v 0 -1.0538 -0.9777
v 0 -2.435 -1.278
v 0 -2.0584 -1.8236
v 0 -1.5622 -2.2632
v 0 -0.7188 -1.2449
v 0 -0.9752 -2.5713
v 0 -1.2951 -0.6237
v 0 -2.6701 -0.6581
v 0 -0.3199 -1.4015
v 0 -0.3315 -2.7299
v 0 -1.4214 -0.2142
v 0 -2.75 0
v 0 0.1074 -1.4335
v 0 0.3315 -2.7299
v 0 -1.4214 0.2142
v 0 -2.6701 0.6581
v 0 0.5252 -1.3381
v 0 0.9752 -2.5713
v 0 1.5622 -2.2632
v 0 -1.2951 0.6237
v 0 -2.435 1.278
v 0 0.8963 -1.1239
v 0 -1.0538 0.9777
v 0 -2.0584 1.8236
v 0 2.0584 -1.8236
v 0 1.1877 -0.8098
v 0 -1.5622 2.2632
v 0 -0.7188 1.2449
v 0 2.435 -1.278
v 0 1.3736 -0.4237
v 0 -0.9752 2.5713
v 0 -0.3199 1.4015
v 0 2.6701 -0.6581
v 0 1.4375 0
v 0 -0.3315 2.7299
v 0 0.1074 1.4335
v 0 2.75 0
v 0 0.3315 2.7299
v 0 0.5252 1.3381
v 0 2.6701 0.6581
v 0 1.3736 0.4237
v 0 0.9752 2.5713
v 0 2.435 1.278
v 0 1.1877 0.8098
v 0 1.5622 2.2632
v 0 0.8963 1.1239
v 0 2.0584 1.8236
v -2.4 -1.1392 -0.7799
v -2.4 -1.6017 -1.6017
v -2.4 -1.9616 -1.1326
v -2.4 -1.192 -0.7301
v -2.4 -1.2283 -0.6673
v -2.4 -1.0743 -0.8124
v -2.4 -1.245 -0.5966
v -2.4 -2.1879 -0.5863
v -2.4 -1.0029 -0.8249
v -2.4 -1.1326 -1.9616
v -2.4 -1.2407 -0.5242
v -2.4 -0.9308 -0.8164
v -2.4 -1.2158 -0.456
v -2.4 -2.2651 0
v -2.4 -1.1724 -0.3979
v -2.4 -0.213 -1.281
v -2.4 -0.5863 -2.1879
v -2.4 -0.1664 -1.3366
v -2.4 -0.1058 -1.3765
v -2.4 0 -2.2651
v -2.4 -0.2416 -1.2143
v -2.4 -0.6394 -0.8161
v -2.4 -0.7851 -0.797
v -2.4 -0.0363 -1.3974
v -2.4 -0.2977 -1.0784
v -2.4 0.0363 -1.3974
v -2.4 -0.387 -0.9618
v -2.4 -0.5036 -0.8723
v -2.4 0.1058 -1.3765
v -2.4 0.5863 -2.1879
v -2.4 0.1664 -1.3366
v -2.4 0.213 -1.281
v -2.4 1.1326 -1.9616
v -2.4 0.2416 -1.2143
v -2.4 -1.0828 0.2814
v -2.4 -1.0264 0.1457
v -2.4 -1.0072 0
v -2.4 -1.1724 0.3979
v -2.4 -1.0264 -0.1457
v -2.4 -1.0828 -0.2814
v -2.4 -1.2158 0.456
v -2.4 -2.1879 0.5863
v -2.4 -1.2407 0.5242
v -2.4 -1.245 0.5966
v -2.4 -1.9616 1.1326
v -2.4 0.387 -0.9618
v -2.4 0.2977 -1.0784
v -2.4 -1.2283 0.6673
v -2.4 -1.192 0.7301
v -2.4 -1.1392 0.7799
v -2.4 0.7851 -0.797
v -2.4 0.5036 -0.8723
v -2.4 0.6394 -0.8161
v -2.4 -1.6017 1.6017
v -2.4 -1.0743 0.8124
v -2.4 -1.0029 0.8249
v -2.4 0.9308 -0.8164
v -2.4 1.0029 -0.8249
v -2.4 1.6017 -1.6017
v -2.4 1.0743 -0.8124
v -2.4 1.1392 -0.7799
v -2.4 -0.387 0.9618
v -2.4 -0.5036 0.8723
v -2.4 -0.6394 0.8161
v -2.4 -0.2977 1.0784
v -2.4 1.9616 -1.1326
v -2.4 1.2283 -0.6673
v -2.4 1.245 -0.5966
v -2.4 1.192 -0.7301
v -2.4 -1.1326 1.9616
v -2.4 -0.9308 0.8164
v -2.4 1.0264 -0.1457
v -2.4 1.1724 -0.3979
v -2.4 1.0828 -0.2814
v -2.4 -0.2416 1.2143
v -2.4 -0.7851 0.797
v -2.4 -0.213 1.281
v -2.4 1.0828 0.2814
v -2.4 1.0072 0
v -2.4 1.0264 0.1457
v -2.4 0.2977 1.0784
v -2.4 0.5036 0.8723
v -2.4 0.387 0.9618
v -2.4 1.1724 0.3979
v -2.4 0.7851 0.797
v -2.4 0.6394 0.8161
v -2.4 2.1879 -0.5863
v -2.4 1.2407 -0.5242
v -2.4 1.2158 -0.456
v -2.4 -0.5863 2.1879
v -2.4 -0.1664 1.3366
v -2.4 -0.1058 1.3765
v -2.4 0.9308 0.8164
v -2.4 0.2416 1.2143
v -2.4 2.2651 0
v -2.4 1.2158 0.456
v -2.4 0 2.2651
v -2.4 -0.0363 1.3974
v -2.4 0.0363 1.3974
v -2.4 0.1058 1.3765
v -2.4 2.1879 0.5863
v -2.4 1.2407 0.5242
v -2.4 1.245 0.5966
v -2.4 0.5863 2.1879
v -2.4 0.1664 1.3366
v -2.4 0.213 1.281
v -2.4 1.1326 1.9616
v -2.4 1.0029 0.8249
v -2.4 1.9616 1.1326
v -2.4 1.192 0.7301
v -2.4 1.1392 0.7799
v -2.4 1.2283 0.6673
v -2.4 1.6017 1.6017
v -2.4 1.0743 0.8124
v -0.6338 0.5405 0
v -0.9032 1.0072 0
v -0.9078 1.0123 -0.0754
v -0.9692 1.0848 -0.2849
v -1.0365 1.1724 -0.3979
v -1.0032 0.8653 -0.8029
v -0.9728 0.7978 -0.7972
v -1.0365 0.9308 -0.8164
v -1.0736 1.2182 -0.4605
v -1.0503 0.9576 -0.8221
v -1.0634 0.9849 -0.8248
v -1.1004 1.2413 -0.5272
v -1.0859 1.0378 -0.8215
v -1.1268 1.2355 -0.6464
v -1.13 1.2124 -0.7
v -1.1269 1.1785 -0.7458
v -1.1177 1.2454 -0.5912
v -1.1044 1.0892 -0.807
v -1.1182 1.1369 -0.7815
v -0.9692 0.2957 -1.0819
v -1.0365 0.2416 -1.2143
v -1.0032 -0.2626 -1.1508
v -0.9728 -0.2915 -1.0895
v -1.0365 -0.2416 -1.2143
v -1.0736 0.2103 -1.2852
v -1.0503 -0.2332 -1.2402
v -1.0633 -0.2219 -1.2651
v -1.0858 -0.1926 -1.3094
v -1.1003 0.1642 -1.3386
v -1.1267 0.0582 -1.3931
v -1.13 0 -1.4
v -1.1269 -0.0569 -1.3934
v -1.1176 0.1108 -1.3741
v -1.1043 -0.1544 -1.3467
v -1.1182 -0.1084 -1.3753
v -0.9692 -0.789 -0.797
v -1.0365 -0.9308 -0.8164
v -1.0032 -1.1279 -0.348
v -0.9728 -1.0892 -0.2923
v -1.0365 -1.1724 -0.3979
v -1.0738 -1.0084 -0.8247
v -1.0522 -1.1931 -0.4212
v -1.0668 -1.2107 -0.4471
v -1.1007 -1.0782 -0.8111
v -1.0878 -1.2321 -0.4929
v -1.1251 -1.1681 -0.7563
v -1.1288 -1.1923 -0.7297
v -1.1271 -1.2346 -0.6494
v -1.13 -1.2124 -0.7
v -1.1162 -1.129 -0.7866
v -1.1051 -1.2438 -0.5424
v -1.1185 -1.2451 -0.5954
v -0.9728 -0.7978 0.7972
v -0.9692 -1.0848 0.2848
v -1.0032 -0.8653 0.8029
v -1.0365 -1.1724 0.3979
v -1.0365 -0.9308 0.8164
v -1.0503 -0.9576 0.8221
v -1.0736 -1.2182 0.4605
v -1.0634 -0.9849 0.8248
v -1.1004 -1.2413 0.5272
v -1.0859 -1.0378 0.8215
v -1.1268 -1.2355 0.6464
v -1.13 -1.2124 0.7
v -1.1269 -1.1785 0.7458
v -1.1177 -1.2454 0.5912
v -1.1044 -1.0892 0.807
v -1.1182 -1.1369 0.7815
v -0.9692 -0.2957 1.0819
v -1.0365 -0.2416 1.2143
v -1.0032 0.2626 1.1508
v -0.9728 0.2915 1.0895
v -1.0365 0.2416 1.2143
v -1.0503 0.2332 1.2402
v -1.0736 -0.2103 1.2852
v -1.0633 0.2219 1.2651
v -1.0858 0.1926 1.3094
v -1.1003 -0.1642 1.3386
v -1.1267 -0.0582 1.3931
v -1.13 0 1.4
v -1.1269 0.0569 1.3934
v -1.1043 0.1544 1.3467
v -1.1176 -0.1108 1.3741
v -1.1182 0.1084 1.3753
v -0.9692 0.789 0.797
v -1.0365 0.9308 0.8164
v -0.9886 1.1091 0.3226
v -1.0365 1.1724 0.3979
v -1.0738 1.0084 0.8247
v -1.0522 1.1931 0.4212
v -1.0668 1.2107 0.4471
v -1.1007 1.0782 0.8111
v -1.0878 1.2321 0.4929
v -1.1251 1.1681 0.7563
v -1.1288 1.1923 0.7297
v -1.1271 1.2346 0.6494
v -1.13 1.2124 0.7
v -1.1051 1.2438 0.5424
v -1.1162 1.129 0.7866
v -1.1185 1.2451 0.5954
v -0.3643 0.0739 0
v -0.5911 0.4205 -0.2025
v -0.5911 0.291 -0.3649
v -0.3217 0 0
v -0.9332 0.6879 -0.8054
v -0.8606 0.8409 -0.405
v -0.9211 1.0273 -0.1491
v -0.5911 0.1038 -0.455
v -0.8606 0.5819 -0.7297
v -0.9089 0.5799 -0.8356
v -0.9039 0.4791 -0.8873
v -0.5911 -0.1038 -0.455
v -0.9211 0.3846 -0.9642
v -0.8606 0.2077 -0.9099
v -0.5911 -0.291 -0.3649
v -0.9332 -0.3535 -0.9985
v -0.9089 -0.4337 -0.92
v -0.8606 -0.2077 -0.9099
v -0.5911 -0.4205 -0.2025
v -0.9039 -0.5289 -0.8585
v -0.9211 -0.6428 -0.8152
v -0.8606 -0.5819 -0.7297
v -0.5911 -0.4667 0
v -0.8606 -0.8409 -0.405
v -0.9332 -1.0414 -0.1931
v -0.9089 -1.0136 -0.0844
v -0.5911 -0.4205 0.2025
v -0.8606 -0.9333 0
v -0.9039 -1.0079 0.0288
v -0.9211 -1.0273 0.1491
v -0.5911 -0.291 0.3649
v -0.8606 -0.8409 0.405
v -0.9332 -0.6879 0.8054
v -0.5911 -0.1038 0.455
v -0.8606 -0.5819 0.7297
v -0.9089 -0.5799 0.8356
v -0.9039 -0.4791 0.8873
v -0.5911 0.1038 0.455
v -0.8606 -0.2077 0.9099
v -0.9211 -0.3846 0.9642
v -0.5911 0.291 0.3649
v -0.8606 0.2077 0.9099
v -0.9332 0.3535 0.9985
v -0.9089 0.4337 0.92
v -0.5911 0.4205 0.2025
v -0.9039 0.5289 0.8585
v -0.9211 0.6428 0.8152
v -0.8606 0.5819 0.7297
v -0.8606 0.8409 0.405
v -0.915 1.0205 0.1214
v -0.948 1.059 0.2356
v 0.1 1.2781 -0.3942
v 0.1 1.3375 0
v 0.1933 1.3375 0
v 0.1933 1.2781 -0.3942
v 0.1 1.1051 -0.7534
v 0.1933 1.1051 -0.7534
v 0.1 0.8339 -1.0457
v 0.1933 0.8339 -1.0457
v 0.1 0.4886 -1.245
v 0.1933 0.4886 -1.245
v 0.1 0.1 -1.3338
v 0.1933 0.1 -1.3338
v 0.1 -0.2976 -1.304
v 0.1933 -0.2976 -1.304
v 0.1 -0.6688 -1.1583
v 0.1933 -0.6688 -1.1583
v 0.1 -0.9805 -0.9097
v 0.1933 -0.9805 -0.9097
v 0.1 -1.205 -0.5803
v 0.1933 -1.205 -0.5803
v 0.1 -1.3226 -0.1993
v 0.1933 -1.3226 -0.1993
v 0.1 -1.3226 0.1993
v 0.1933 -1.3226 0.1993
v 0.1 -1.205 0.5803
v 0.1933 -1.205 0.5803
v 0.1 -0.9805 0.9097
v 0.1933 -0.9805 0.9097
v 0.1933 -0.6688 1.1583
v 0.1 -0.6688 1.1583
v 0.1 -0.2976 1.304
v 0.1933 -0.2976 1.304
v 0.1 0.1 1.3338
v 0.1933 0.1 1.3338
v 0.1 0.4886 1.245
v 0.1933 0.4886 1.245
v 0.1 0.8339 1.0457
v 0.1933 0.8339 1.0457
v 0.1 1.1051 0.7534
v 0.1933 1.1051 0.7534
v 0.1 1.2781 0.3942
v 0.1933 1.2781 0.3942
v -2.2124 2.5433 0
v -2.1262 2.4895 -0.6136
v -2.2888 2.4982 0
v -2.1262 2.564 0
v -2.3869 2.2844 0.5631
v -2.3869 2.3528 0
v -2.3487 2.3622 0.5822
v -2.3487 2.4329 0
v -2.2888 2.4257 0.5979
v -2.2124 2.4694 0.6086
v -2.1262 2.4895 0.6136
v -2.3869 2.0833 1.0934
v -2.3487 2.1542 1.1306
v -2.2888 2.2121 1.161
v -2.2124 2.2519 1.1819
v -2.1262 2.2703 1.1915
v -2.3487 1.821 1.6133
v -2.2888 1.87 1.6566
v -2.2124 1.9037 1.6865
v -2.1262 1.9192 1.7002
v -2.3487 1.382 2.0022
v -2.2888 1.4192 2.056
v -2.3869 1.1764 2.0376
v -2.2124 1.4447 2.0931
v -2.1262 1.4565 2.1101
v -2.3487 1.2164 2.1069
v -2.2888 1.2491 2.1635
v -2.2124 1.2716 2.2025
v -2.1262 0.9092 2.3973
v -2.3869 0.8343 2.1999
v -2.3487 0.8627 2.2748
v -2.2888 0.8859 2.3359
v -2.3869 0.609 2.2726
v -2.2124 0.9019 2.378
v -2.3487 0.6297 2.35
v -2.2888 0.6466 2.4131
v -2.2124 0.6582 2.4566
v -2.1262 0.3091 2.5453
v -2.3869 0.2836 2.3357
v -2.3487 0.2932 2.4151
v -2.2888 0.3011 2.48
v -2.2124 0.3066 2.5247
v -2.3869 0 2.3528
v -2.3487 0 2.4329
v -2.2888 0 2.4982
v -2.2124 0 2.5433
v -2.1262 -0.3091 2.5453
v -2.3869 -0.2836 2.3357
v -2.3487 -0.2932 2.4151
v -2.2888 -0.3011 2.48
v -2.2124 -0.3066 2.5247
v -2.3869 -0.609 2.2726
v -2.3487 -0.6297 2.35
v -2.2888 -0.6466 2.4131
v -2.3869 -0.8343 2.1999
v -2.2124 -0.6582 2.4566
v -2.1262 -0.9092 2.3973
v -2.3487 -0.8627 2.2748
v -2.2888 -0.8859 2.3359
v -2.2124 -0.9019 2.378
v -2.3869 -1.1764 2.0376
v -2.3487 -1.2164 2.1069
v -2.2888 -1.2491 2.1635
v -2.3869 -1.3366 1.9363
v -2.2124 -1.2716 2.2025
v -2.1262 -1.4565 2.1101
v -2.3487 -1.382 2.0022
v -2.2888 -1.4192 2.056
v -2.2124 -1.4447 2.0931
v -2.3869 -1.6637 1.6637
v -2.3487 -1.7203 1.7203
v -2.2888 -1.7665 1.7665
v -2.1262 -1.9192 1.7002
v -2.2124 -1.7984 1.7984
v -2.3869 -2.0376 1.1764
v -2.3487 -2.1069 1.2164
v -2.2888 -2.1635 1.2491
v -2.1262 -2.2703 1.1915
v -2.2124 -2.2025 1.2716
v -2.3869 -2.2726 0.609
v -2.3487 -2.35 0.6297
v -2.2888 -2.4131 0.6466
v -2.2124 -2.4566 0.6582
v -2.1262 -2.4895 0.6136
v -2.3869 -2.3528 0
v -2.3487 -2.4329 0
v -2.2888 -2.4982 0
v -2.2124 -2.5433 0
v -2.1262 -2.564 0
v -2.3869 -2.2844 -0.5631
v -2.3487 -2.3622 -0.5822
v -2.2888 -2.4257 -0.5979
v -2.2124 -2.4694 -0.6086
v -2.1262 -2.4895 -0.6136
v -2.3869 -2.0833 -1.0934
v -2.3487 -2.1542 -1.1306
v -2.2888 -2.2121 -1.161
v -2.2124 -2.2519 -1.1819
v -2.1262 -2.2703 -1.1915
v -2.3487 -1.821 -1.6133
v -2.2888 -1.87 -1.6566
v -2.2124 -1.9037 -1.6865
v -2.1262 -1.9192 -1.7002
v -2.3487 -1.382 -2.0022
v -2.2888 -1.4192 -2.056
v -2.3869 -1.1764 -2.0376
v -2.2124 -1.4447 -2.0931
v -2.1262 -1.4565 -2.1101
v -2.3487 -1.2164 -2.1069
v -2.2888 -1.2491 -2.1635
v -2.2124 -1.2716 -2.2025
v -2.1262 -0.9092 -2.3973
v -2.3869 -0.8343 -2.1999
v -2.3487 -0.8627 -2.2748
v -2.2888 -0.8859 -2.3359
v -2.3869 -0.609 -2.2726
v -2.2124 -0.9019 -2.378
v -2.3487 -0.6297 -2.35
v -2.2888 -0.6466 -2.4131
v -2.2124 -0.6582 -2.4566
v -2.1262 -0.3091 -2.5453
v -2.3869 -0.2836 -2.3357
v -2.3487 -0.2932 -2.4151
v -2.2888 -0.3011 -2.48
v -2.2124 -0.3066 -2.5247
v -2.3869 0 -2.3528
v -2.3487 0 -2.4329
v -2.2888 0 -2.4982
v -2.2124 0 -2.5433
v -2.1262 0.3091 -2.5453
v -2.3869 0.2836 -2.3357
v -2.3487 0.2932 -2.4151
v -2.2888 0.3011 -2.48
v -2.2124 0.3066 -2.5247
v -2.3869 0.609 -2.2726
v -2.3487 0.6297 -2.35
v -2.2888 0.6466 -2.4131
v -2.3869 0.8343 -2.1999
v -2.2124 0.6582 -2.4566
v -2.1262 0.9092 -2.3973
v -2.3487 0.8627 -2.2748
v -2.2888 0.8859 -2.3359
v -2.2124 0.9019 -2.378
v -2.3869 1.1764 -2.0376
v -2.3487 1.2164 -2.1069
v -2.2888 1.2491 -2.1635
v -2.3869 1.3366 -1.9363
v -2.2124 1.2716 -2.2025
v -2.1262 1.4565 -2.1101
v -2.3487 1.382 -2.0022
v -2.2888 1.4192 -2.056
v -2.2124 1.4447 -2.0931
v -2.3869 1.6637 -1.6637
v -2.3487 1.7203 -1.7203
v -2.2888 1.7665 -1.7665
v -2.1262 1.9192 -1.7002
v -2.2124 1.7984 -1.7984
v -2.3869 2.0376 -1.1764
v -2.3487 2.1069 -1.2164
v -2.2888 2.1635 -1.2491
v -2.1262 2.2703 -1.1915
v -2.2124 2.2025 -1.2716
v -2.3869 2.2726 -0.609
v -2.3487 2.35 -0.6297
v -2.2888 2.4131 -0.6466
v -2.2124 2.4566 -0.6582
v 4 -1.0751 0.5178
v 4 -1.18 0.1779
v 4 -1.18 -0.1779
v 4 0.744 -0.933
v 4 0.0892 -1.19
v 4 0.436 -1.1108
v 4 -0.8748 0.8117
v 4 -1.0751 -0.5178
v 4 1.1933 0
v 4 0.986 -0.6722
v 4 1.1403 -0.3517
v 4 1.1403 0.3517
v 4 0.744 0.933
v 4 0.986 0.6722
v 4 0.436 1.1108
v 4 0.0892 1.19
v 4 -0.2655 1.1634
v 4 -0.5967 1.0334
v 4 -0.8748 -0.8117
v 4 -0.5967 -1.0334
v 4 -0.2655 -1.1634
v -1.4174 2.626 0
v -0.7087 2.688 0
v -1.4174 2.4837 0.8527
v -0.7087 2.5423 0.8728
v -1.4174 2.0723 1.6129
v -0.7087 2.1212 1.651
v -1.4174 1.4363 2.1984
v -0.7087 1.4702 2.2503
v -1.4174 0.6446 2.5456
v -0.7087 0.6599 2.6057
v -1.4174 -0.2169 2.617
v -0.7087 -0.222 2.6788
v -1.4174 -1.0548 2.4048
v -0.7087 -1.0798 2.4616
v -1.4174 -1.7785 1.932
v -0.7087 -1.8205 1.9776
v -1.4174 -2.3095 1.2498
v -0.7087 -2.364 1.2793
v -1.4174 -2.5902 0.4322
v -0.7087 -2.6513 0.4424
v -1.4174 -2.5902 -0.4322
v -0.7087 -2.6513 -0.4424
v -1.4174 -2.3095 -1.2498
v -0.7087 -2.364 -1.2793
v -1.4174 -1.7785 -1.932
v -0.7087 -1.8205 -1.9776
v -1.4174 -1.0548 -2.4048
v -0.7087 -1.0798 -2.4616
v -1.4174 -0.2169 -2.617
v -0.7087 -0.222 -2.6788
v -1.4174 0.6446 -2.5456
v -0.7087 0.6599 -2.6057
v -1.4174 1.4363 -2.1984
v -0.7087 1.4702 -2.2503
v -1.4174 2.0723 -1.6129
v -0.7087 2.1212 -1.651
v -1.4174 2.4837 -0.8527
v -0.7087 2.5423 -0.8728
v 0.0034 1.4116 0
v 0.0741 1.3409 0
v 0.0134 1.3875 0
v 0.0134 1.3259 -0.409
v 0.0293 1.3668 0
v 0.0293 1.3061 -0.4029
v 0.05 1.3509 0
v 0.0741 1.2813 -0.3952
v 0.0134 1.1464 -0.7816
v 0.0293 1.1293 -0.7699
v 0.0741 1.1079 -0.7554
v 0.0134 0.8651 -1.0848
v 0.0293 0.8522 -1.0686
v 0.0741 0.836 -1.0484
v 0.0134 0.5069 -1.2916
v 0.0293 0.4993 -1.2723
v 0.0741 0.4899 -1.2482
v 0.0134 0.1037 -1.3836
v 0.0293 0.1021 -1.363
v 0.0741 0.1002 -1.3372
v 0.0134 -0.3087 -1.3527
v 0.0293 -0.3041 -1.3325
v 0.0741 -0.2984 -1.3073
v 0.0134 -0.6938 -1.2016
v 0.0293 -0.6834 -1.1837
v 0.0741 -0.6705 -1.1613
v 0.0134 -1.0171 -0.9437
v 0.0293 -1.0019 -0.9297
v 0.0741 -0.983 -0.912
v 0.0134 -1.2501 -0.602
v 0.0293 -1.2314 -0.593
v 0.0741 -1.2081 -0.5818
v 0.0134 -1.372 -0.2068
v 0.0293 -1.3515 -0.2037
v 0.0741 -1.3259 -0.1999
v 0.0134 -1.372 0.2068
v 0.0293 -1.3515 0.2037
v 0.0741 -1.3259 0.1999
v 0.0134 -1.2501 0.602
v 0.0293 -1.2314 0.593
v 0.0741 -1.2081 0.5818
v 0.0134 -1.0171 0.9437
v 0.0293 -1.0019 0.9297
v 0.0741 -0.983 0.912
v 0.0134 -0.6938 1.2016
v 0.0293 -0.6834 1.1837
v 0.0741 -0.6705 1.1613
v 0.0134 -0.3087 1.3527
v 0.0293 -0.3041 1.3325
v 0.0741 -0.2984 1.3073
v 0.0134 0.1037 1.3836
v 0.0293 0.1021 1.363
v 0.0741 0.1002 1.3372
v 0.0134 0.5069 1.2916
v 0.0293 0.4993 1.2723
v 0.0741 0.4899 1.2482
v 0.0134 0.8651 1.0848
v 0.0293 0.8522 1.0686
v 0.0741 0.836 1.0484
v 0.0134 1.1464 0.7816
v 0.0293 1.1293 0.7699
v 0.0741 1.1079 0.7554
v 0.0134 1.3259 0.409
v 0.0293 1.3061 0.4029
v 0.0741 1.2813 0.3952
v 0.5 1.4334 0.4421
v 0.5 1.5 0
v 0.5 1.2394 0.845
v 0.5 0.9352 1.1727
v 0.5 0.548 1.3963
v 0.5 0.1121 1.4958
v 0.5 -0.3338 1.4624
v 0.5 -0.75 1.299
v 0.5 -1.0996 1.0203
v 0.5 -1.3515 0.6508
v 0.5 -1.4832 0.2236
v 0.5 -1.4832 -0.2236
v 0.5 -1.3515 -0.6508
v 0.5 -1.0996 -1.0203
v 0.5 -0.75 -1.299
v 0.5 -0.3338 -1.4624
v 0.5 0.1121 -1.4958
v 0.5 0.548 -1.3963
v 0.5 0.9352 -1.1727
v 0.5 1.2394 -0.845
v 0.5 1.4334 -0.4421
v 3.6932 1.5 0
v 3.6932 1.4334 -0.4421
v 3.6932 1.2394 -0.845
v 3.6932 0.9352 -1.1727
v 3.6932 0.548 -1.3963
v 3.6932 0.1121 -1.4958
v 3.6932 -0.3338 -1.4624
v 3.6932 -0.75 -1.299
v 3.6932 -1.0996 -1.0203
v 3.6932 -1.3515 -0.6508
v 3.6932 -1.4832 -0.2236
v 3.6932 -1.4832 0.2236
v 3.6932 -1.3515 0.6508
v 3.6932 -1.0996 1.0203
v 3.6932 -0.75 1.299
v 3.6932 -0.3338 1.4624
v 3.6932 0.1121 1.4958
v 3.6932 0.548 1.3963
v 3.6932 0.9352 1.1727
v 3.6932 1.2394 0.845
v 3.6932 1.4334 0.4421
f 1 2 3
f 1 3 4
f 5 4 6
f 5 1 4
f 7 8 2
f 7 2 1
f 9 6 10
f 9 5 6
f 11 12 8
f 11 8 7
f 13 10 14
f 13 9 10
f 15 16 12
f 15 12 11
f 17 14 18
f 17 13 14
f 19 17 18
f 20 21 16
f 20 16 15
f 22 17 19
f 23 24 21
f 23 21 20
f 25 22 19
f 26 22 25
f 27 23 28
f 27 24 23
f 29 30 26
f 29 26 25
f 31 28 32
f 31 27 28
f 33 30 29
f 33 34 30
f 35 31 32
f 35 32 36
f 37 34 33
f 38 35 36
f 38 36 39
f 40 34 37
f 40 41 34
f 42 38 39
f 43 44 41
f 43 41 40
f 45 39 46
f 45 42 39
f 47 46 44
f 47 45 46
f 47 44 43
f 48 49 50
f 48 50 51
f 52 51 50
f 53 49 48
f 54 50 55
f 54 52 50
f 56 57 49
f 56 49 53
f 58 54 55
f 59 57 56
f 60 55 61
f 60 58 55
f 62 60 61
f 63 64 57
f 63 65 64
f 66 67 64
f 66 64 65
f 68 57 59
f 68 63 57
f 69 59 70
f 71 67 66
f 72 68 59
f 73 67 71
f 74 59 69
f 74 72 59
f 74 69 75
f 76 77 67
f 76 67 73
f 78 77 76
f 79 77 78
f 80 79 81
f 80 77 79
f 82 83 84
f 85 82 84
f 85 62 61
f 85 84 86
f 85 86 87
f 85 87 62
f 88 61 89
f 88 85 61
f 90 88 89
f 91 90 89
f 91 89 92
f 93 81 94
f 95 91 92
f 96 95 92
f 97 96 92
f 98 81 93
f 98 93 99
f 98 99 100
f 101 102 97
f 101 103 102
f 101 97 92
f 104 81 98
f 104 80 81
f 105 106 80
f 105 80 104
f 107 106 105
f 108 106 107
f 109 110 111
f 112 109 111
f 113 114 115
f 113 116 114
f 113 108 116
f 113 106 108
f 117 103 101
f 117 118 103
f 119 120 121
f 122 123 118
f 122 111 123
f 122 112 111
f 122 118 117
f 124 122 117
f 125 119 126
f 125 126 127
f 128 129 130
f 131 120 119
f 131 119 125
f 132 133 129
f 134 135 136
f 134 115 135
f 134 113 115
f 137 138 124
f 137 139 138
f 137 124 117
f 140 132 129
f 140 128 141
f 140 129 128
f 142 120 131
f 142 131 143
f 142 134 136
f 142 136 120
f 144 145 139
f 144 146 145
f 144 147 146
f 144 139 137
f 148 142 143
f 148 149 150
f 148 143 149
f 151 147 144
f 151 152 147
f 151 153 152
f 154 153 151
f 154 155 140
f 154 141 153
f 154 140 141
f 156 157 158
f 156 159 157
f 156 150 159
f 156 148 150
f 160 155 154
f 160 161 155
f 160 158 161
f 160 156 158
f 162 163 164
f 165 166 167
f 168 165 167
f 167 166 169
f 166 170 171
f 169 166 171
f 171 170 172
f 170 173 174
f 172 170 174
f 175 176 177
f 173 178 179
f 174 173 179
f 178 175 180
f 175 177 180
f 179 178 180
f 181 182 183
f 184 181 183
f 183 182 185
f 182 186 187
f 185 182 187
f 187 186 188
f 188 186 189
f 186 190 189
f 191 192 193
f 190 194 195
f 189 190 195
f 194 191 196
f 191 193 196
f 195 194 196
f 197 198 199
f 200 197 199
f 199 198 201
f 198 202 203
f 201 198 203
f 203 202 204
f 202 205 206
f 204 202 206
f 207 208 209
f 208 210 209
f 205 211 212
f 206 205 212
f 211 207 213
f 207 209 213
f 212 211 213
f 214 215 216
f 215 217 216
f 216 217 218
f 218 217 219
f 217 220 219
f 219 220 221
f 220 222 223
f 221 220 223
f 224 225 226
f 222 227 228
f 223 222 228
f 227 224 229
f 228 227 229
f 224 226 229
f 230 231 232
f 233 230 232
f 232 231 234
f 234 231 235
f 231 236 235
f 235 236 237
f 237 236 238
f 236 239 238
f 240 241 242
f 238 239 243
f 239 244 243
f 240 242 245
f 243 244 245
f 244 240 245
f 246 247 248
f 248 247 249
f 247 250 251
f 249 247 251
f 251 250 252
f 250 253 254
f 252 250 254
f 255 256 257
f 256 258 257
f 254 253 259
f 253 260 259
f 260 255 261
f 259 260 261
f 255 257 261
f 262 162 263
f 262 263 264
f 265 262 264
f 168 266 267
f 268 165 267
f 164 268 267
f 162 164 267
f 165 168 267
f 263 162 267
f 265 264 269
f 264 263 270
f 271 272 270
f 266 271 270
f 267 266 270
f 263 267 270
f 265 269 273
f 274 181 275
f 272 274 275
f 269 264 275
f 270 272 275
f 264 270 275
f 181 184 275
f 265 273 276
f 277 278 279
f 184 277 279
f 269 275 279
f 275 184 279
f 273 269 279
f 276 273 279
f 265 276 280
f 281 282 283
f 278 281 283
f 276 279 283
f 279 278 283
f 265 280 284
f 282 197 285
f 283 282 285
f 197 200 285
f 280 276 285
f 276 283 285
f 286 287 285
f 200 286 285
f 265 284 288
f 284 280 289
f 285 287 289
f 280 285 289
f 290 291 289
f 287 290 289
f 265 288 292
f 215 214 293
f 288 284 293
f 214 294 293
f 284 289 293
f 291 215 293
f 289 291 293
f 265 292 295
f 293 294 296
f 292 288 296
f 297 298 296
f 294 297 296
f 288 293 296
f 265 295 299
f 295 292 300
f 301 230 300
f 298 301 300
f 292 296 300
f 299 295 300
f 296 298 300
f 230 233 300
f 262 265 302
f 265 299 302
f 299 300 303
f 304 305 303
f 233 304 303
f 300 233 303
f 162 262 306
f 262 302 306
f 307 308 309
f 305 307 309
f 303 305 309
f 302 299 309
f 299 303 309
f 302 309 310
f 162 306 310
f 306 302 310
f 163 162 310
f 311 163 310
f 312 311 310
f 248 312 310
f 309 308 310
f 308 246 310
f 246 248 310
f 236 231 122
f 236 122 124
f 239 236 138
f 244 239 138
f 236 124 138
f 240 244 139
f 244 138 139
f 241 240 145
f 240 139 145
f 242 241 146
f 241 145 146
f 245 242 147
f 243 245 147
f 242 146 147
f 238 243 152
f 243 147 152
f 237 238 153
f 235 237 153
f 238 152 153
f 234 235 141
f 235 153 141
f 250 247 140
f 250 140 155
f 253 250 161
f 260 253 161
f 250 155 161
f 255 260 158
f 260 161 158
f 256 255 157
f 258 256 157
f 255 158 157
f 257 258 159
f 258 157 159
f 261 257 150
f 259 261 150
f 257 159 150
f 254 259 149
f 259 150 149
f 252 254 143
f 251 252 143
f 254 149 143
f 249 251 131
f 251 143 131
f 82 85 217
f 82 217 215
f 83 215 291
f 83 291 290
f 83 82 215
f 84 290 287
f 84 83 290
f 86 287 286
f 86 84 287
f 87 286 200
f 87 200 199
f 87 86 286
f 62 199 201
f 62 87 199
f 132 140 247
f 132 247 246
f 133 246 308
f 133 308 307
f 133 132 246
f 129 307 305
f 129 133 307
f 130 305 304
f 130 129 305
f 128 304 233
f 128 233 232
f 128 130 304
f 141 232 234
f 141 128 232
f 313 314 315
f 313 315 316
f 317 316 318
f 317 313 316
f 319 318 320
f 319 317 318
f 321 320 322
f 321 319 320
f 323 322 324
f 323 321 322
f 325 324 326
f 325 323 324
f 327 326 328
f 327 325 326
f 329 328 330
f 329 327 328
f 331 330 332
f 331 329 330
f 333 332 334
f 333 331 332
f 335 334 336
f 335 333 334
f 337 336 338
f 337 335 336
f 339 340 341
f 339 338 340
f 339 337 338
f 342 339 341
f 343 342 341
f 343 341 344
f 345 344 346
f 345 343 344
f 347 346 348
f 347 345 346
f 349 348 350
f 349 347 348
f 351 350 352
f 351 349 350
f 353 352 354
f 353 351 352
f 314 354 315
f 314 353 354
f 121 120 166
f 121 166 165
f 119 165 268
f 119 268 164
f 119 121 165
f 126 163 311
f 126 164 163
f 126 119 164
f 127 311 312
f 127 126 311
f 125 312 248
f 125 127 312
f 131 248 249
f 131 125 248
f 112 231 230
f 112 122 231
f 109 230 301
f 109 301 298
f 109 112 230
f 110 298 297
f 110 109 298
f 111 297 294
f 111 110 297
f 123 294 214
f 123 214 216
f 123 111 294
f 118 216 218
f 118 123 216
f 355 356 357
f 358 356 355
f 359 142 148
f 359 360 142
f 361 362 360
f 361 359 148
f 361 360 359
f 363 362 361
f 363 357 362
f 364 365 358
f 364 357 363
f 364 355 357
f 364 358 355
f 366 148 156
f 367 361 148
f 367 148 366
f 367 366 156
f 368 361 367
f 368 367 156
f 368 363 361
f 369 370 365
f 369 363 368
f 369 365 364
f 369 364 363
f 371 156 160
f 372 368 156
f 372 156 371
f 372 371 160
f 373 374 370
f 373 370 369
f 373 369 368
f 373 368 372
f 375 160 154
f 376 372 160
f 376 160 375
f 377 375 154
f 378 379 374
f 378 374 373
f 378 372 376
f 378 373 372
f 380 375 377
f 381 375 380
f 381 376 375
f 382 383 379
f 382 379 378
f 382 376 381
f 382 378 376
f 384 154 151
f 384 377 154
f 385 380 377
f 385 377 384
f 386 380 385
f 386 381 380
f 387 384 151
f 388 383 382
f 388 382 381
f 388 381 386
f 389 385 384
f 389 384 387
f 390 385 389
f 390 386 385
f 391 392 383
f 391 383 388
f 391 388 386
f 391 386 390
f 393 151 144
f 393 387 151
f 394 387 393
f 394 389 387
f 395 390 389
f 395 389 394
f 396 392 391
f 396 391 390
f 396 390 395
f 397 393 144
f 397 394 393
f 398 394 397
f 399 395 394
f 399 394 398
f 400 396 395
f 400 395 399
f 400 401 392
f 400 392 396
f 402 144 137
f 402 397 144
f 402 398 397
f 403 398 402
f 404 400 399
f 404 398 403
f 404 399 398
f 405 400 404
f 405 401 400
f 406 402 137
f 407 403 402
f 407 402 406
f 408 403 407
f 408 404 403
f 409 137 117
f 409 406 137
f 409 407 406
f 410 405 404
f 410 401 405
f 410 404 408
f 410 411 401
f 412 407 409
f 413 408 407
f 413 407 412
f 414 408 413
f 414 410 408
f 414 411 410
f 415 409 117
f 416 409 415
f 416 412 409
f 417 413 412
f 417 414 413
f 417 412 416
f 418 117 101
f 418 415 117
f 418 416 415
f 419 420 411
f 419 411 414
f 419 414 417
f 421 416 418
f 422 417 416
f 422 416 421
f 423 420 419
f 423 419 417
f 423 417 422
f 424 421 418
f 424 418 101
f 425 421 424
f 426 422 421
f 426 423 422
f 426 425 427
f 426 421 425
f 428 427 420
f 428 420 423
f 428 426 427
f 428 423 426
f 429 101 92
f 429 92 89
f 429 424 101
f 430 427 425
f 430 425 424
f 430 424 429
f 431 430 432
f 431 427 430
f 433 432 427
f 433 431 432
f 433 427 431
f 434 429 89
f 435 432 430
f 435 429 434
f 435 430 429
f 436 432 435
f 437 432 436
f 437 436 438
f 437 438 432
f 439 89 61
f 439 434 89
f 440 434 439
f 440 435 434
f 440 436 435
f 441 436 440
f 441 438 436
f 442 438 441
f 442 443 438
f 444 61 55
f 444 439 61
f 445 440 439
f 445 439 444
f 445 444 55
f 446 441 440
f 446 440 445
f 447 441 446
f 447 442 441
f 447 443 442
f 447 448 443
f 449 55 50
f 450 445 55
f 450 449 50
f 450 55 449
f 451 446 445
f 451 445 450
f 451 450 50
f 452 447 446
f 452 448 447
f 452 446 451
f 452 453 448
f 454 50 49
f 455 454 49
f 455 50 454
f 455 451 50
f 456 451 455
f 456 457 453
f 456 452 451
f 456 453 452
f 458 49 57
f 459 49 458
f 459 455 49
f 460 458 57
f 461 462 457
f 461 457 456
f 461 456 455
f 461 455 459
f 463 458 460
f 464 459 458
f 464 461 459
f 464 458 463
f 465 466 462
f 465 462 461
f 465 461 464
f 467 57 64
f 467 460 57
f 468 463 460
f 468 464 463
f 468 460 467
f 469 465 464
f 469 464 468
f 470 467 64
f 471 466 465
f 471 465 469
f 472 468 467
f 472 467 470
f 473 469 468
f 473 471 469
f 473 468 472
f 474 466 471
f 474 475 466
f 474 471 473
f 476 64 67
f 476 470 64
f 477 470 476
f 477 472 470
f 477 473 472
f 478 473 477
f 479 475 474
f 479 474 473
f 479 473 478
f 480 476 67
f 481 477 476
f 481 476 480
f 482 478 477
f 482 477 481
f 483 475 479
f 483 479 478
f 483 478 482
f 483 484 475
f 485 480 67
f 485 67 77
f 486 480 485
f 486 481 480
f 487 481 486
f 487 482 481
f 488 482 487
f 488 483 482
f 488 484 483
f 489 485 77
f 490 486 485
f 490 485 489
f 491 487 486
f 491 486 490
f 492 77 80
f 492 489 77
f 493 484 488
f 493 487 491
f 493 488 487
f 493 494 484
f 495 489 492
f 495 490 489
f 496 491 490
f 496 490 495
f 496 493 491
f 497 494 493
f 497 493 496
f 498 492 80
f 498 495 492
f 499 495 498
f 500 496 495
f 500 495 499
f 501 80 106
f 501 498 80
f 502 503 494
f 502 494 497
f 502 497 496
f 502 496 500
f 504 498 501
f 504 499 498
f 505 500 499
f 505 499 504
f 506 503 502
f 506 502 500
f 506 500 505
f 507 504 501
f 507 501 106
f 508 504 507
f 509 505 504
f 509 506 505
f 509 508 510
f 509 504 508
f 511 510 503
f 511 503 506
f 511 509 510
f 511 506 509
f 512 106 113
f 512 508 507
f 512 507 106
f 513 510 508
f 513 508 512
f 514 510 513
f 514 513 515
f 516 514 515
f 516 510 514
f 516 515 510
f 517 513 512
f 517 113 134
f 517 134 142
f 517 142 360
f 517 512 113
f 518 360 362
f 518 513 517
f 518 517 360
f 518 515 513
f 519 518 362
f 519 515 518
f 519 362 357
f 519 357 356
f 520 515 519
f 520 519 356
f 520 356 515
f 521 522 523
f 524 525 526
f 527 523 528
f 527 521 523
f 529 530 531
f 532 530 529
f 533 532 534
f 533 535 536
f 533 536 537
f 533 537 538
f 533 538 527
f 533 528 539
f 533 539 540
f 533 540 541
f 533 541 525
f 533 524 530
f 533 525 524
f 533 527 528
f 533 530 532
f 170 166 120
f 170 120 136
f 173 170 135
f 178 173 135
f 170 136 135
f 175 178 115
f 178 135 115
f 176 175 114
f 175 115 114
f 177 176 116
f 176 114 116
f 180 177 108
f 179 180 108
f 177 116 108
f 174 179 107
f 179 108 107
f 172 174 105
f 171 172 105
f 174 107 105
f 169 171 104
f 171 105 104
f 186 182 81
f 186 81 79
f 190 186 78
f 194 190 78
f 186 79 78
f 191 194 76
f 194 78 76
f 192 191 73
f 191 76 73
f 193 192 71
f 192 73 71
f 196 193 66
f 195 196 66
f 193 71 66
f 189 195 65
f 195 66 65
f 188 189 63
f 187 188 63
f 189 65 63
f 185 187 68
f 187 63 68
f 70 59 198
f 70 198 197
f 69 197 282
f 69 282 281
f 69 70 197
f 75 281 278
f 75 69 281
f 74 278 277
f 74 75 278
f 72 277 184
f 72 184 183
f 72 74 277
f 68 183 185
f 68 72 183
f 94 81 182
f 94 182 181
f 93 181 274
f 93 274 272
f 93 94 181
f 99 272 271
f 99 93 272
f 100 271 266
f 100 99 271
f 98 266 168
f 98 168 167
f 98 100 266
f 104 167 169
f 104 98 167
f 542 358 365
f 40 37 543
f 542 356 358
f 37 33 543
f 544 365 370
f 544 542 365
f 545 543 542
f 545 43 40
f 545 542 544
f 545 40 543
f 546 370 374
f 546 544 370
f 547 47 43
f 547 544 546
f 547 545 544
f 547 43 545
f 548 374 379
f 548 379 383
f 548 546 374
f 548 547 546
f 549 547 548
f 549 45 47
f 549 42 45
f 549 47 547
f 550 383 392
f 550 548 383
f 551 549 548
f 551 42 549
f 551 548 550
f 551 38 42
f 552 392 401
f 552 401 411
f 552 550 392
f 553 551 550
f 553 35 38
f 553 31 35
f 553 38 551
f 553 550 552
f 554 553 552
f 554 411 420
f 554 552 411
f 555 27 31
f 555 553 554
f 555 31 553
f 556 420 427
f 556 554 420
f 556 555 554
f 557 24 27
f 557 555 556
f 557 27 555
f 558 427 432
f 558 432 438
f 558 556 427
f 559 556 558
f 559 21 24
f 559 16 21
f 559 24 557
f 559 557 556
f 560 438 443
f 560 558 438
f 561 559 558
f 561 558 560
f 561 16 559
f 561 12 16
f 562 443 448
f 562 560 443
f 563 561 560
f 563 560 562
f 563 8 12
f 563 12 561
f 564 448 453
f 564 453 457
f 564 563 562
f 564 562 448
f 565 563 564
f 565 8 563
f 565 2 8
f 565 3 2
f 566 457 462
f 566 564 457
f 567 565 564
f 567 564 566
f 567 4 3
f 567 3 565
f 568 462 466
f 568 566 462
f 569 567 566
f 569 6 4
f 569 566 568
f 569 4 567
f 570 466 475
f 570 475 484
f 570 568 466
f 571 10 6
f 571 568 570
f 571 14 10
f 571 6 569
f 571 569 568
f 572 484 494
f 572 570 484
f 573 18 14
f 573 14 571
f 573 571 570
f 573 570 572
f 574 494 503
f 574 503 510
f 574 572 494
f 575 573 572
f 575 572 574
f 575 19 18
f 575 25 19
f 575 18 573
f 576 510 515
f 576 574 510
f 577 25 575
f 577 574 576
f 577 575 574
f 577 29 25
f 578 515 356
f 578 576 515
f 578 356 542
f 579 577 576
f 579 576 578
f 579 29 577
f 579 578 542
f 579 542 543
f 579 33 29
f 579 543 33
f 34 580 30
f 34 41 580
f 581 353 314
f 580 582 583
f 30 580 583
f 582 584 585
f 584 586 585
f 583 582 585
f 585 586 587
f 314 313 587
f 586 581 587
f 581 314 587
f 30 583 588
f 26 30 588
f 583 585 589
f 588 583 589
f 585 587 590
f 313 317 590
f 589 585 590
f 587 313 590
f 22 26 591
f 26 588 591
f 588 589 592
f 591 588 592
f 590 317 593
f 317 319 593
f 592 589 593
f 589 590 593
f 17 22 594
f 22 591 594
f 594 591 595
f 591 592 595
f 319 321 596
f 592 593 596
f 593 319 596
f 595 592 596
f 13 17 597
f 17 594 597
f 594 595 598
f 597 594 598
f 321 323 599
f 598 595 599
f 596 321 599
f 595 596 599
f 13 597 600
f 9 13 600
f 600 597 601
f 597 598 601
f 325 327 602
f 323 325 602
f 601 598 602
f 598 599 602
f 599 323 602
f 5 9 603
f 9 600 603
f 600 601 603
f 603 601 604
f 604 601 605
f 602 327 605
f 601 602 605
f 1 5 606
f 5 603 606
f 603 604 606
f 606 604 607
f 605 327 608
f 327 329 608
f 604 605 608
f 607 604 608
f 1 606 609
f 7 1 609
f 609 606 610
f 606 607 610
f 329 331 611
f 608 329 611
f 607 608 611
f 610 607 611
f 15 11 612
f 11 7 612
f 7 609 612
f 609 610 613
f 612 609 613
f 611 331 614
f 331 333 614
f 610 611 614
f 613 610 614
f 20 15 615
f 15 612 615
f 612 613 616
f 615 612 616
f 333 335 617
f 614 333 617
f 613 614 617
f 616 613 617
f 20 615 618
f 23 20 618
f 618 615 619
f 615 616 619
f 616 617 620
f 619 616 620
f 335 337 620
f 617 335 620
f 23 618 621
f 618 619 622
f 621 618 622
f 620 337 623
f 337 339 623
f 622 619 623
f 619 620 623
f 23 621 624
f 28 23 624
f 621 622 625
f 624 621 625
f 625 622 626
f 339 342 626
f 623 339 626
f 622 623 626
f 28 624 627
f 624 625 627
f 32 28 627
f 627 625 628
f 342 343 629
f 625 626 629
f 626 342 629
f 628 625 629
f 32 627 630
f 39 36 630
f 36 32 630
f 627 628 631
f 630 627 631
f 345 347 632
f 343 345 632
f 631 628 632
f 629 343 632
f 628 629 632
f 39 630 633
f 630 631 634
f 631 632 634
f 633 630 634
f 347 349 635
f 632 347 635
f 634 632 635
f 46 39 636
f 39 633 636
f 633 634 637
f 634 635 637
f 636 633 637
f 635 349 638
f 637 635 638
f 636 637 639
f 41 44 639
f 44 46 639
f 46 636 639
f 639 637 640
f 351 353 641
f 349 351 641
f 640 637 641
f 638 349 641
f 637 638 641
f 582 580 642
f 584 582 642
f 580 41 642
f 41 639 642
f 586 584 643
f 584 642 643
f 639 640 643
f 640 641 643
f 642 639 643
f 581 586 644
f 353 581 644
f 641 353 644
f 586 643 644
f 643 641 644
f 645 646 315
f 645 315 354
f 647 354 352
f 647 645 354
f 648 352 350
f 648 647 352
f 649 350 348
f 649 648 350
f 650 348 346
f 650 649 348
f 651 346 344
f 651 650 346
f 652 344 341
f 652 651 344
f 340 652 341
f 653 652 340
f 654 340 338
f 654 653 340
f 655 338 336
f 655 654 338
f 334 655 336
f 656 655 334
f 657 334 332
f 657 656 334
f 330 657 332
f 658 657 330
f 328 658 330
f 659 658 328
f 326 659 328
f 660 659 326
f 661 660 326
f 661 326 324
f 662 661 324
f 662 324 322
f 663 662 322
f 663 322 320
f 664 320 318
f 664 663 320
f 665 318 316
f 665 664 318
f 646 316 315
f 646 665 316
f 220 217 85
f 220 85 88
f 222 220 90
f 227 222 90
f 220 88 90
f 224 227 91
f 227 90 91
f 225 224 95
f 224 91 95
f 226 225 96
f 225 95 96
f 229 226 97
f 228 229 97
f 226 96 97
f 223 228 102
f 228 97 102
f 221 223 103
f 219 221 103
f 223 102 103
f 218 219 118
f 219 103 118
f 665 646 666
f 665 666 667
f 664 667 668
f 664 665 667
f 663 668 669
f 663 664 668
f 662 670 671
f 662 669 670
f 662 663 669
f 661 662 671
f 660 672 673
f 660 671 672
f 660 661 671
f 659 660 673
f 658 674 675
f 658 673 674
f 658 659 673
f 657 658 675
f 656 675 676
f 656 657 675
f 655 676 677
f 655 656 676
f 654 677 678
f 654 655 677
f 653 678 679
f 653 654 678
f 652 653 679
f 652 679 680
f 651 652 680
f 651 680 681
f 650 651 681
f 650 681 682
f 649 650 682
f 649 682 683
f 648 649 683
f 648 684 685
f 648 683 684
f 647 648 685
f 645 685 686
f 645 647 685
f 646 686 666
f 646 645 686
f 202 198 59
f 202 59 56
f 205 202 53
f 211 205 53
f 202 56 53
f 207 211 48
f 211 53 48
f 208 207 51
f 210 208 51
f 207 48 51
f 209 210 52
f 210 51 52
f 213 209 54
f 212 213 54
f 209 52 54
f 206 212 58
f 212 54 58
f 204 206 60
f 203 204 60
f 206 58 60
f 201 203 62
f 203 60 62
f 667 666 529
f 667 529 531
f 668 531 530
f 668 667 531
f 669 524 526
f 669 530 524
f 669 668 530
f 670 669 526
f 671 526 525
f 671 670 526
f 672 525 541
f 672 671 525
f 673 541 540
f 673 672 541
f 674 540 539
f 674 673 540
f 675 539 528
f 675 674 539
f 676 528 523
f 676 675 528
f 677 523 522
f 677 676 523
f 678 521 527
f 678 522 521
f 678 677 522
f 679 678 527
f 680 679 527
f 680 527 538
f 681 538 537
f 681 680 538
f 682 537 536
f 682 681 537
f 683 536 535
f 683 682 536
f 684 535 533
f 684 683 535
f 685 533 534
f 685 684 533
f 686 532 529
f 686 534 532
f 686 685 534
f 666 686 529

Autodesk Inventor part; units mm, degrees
ref_plane "YZ Plane" through (0, 0, 0) normal (1, 0, 0) x (0, 1, 0)
ref_plane "XZ Plane" through (0, 0, 0) normal (0, 1, 0) x (-1, 0, 0)
sketch "Sketch1" plane through (0, 0, 0) normal (0, 0, 1) x (1, 0, 0)
  line L0 (-0.3217, 0) -> (4, 0)
  line L1 (4, 0) -> (4, 1.5)
  line L2 (4, 1.5) -> (0.5, 1.5)
  line L3 (0.5, 1.5) -> (0.1933, 1.3375)
  line L4 (0.1933, 1.3375) -> (0.1, 1.3375)
  line L5 (0, 1.4375) -> (0, 2.75)
  line L6 (0, 2.75) -> (-2.4, 2.75)
  line L7 (-2.4, 2.75) -> (-2.4, 1.4)
  line L8 (-2.4, 1.4) -> (-1.13, 1.4)
  line L9 (-1.13, 1.4) -> (-0.3217, 0)
  line L10 (-3.68, 0) -> (5.28, 0) projected
  line L11 (0, -0.55) -> (0, 3.3) projected
  line L12 (0.5, 1.5) -> (0, 1.5) construction
  arc A0 (0, 1.4375) -> (0.1, 1.3375) centre (0.1, 1.4375) ccw
  line L13 (0, 2.75) -> (-2.4, 2.54)
  point P0 (0, 1.3375)
  dimension "d1" = 3.5
  dimension "d2" = 0.3067
  dimension "d3" = 2.4
  dimension "d4" = 1.27
  dimension "d5" = 60
  dimension "d6" = 3
  dimension "d7" = 2.675
  dimension "d8" = 2.8
  dimension "d9" = 5.5
  dimension "d20" = 4
  dimension "d34" = 0.1
  dimension "d35" = 5
revolve "Body" add sketch "Sketch1" angle 360 about axis through (-0.3217, 0, 0) along (1, 0, 0)
sketch "Sketch2" plane through (-2.4, 0, 0) normal (-1, 0, 0) x (0, 0, 1)
  line L0 (0, -4.9779) -> (0, 10.6176) projected
  line L1 (-5.0424, 0) -> (11.0045, 0) projected
  circle A0 centre (0, 0) radius 2.75 projected
  circle A1 centre (0, 0) radius 1.0072
  line L2 (0, 0) -> (4.8438, 8.3897) construction
  line L3 (0, 0) -> (8.7121, 5.0299) construction
  circle A2 centre (0, 0) radius 1.4 projected
  arc A3 (0.8164, 0.9308) -> (0.3979, 1.1724) centre (0.575, 0.9959) ccw
  arc A4 (1.2143, -0.2416) -> (1.2143, 0.2416) centre (1.15, 0) ccw
  arc A5 (0.8164, 0.9308) -> (1.2143, 0.2416) centre (1.3588, 0.7845) ccw
  arc A6 (-0.3979, 1.1724) -> (-0.8164, 0.9308) centre (-0.575, 0.9959) ccw
  arc A7 (-1.2143, 0.2416) -> (-1.2143, -0.2416) centre (-1.15, 0) ccw
  arc A8 (-1.2143, 0.2416) -> (-0.8164, 0.9308) centre (-1.3588, 0.7845) ccw
  arc A9 (0.3979, -1.1724) -> (0.8164, -0.9308) centre (0.575, -0.9959) ccw
  arc A10 (1.2143, -0.2416) -> (1.2143, 0.2416) centre (1.15, 0) ccw
  arc A11 (1.2143, -0.2416) -> (0.8164, -0.9308) centre (1.3588, -0.7845) ccw
  arc A12 (-0.8164, -0.9308) -> (-0.3979, -1.1724) centre (-0.575, -0.9959) ccw
  arc A13 (-0.8164, -0.9308) -> (-1.2143, -0.2416) centre (-1.3588, -0.7845) ccw
  arc A14 (-1.2143, 0.2416) -> (-1.2143, -0.2416) centre (-1.15, 0) ccw
  arc A15 (-0.3979, 1.1724) -> (0.3979, 1.1724) centre (0, 1.569) ccw
  arc A16 (0.3979, -1.1724) -> (-0.3979, -1.1724) centre (0, -1.569) ccw
  dimension "d38" = 2.0144
  dimension "d39" = 30
  dimension "d40" = 60
  dimension "d42" = 0.25
extrude "Slot" add sketch "Sketch2" against normal up to next contours A2 A12 A16 L0 | L0 A16 A9 A2 | A2 A7 A13 A12 | A9 A11 A4 A2 | A2 A6 A8 A7 | A4 A5 A3 A2 | A2 L0 A15 A6 | A2 A3 A15 L0
revolve "Taper" cut sketch "Sketch1" angle 360 about axis through (0, 0, 0) along (1, 0, 0) contours L13 L7 L6
fillet "Fillet1" radius 0.3 1 edges at (-2.4, -2.54, 0)
thread "Thread" size "M3x0.5" designation "M3" class "6g" standard "GB Metric profile" length 3.5
chamfer "Chamfer1" distance 0.3067 distance2 0.3068 1 edges at (4, -1.5, 0) measured on face at (4, -0.2617, -0.7882)
ref_plane "Work Plane1" through (0, 0, 0) normal (0, 0.5, 0.866) x (1, 0, 0)
equation "\"d1\" = GEL"
equation "\"d2\" = GAL"
equation "\"d3\" = KOH"
equation "\"d4\" = INTI"
equation "\"d6\" = GD"
equation "\"d7\" = BDM"
equation "\"d8\" = E0"
equation "\"d9\" = KOD"
equation "\"d20\" = NLG"
equation "\"d34\" = R"
equation "\"d38\" = SW"
equation "\"d42\" = RRK"
equation "\"d17\" = RR"
equation "\"d13\" = GEL"
equation "\"d15\" = -0.5 * SPD + 0.5 * GD"
equation "\"GD\" = NND"
equation "\"NLG\" = 4"
equation "\"GEL\" = 3.5"
equation "\"KOD\" = 5.5"
equation "\"KOH\" = 2.4"
equation "\"INTI\" = 1.27"
equation "\"GAL\" = 0.61345 * PTC"
equation "\"GUL\" = 0.61345 * PTC"
equation "\"BDM\" = 2.675"
equation "\"SW\" = 2.0144"
equation "\"RR\" = 0.3"
equation "\"SPD\" = NND - 1.2269 * PTC"
equation "\"R\" = 0.1"
equation "\"E0\" = 2.8"
equation "\"RRK\" = 0.25"
equation "\"PHH\" = 0"
equation "\"GD1\" = THREADDIA - 1.2269 * PTC"
equation "\"THREADDIA\" = 3"
equation "\"FAWI\" = 90deg"
equation "\"ANG\" = 120deg"
equation "\"PTC\" = 0.5"
equation "\"NND\" = 3"
equation "\"TOA\" = 30deg"
equation "\"KEWI\" = 5deg"
properties part number "Screw GB/T 2171.1 M3 x 4" material "Steel, Mild"
